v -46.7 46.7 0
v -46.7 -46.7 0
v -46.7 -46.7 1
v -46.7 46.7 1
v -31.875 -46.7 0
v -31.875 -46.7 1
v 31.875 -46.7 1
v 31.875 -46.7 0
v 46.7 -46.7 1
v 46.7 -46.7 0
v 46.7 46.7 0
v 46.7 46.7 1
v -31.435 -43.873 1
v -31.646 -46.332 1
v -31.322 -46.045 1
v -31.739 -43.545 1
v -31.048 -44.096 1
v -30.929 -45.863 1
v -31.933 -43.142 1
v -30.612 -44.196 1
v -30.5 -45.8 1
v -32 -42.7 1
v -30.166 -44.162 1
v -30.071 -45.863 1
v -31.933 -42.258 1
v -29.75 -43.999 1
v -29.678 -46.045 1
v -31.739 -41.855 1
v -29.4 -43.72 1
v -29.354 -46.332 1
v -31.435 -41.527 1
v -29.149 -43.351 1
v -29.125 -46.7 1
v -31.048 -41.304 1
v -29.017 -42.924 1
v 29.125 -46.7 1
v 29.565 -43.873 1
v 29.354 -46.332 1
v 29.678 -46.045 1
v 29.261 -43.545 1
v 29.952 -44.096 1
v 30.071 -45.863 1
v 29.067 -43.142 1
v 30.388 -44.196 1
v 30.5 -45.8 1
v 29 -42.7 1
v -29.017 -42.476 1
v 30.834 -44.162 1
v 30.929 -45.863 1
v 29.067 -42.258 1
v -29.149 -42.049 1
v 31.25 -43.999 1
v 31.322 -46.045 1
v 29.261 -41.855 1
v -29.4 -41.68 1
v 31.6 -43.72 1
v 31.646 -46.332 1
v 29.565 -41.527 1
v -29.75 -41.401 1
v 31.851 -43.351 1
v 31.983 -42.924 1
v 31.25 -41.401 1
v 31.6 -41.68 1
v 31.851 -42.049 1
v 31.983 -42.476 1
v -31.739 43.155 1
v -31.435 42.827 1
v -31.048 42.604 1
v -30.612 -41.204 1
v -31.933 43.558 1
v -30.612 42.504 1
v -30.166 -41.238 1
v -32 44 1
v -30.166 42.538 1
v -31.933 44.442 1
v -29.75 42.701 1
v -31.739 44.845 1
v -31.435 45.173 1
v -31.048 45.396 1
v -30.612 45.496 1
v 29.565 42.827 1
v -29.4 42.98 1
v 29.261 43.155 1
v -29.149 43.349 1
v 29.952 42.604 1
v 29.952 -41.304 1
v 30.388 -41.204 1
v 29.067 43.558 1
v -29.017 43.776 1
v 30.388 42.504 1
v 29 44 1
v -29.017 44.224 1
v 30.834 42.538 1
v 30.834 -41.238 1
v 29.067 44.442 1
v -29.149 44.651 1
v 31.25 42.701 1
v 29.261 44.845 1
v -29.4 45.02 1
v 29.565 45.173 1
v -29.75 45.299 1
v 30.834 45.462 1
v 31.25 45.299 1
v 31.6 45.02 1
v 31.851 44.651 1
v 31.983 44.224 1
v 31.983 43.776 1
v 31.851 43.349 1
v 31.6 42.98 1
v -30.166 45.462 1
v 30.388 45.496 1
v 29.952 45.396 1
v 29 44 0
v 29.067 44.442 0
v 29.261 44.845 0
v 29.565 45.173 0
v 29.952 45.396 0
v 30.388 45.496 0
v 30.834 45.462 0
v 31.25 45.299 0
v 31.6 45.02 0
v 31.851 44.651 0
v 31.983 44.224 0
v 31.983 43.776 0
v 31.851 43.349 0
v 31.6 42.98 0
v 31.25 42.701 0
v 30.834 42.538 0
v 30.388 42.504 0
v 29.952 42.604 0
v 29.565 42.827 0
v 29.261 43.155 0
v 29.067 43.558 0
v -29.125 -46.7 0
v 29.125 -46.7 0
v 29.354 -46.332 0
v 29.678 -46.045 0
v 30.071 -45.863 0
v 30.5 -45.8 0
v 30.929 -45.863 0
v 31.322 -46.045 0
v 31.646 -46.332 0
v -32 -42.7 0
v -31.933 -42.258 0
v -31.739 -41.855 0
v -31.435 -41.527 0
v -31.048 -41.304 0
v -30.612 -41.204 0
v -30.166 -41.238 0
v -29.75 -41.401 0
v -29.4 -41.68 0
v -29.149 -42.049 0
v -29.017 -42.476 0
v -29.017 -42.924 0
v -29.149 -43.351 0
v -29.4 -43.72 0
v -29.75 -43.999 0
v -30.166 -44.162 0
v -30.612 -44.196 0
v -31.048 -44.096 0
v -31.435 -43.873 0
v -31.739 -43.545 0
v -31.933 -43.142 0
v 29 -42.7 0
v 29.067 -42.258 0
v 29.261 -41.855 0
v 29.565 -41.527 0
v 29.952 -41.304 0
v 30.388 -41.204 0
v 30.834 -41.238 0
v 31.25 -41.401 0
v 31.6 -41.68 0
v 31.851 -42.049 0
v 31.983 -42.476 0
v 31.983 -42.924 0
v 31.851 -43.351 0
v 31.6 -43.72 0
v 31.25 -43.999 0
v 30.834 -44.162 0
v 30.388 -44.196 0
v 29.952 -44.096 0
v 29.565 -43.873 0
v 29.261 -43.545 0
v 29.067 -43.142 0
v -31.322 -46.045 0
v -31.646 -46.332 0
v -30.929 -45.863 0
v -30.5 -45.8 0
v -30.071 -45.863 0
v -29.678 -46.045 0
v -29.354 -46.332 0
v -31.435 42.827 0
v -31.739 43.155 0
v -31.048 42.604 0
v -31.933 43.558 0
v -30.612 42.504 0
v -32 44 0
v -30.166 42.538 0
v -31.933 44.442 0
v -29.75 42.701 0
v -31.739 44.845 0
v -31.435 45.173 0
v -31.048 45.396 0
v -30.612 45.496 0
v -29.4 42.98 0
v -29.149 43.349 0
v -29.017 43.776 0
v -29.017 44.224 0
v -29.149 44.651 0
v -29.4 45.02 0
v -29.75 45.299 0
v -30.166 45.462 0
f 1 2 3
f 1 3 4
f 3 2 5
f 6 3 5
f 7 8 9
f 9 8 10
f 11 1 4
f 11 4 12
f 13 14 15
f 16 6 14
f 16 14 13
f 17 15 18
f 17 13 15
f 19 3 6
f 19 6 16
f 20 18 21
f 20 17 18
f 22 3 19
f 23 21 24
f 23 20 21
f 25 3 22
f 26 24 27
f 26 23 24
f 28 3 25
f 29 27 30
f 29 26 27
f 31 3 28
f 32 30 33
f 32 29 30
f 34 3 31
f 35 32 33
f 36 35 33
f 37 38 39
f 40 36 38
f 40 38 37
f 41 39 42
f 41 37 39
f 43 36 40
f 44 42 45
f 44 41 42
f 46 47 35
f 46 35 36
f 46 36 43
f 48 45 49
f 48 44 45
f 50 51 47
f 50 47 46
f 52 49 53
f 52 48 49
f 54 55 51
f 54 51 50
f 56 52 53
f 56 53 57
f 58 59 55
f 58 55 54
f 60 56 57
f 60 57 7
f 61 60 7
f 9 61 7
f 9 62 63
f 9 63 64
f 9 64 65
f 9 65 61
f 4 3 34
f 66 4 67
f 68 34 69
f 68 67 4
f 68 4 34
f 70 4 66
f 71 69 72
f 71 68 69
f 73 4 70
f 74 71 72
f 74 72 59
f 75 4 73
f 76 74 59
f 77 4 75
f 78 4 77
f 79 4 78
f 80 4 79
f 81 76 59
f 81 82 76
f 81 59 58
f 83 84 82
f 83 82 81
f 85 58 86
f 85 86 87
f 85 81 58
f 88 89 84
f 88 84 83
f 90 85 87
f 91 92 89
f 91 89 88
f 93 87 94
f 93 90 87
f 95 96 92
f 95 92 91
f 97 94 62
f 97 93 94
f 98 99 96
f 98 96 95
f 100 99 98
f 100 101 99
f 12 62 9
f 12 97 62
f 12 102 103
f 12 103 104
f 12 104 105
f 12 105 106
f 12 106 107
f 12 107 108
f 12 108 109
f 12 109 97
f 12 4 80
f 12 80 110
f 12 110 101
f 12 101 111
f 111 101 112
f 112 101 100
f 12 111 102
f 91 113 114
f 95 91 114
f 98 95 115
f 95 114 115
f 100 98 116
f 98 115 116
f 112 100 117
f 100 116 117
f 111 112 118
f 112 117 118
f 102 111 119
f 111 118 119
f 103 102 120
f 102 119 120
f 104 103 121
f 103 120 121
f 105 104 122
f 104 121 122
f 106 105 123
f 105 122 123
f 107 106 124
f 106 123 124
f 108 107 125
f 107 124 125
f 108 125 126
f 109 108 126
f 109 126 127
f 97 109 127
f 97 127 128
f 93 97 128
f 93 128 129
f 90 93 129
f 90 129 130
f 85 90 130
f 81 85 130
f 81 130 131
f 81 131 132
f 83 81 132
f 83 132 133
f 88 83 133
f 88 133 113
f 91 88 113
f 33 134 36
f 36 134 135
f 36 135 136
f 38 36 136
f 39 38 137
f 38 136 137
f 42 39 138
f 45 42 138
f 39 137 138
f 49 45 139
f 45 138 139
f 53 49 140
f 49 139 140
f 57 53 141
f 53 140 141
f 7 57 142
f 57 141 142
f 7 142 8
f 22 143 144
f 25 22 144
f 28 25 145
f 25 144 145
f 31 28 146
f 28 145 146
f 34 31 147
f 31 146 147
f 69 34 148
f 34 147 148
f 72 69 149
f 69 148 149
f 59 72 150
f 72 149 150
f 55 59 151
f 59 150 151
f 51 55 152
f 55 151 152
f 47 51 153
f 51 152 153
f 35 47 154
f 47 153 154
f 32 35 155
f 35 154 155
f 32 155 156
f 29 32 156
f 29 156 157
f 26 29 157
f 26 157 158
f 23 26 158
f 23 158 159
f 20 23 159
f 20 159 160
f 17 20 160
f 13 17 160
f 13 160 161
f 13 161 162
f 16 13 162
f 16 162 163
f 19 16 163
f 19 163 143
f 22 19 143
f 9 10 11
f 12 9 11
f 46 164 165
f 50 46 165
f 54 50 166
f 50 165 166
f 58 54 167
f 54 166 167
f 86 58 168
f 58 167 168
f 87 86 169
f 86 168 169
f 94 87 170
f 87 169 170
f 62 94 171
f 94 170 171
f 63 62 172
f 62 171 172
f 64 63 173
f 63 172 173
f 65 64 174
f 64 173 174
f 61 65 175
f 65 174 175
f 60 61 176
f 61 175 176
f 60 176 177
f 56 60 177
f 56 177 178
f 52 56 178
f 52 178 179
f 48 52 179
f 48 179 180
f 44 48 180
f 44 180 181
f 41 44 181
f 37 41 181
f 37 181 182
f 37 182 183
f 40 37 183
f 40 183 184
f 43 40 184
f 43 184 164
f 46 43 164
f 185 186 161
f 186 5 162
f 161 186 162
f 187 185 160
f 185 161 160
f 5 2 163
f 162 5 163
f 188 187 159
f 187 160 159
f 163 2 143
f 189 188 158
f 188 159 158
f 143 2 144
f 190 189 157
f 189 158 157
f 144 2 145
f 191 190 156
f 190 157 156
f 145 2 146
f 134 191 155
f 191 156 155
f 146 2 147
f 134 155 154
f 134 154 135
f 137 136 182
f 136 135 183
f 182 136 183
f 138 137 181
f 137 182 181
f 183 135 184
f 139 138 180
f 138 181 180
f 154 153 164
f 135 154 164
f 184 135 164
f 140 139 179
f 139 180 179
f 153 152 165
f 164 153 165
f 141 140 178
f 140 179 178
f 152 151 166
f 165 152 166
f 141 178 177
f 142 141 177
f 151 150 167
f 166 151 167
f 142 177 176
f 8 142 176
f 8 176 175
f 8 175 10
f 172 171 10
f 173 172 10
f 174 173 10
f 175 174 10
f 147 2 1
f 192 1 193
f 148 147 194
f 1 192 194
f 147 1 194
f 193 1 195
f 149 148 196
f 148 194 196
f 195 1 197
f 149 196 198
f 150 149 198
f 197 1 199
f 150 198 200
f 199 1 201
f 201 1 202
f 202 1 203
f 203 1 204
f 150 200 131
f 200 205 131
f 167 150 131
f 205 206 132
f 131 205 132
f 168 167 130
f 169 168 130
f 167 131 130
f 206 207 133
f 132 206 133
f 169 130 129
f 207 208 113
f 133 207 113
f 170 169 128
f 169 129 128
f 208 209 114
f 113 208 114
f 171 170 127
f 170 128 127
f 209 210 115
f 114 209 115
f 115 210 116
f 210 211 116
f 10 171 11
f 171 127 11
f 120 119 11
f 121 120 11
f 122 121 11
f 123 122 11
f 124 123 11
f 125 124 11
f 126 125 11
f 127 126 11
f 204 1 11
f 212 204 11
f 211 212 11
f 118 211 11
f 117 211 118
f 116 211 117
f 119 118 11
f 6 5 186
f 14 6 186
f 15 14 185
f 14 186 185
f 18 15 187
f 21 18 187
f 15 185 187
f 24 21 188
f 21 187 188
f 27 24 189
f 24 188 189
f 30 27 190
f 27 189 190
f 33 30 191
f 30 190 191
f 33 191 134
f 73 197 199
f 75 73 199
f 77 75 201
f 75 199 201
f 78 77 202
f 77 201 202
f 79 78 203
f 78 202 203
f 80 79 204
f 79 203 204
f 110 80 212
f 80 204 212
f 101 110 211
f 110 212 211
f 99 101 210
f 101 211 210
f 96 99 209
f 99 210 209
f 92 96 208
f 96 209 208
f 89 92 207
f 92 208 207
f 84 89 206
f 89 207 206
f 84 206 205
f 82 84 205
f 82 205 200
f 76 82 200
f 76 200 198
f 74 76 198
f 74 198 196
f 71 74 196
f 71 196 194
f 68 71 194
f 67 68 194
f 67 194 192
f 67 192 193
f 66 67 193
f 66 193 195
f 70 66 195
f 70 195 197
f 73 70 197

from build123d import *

# Parameters (mm, degrees)
SKETCH1_W                    = 93.4
SKETCH1_H                    = 93.4
BOSS_EXTRUDE1_DEPTH          = 1
F_3_0_3_DIAMETER_HOLE1_D     = 3
F_3_0_3_DIAMETER_HOLE1_DEPTH = 1


with BuildPart() as part:
    # Sketch1 → Boss-Extrude1 (new body)
    with BuildSketch(Plane.XY):
        Rectangle(SKETCH1_W, SKETCH1_H)
    extrude(amount=BOSS_EXTRUDE1_DEPTH)

    # Ø3.0 (3) Diameter Hole1
    with Locations(Plane.XY.offset(1)):
        with Locations((-30.5, -47.3), (30.5, -47.3), (30.5, -42.7), (-30.5, -42.7), (-30.5, 44), (30.5, 44), (-30.5, -66), (30.5, -66)):
            Hole(F_3_0_3_DIAMETER_HOLE1_D / 2, depth=F_3_0_3_DIAMETER_HOLE1_DEPTH)


solid = part.part
